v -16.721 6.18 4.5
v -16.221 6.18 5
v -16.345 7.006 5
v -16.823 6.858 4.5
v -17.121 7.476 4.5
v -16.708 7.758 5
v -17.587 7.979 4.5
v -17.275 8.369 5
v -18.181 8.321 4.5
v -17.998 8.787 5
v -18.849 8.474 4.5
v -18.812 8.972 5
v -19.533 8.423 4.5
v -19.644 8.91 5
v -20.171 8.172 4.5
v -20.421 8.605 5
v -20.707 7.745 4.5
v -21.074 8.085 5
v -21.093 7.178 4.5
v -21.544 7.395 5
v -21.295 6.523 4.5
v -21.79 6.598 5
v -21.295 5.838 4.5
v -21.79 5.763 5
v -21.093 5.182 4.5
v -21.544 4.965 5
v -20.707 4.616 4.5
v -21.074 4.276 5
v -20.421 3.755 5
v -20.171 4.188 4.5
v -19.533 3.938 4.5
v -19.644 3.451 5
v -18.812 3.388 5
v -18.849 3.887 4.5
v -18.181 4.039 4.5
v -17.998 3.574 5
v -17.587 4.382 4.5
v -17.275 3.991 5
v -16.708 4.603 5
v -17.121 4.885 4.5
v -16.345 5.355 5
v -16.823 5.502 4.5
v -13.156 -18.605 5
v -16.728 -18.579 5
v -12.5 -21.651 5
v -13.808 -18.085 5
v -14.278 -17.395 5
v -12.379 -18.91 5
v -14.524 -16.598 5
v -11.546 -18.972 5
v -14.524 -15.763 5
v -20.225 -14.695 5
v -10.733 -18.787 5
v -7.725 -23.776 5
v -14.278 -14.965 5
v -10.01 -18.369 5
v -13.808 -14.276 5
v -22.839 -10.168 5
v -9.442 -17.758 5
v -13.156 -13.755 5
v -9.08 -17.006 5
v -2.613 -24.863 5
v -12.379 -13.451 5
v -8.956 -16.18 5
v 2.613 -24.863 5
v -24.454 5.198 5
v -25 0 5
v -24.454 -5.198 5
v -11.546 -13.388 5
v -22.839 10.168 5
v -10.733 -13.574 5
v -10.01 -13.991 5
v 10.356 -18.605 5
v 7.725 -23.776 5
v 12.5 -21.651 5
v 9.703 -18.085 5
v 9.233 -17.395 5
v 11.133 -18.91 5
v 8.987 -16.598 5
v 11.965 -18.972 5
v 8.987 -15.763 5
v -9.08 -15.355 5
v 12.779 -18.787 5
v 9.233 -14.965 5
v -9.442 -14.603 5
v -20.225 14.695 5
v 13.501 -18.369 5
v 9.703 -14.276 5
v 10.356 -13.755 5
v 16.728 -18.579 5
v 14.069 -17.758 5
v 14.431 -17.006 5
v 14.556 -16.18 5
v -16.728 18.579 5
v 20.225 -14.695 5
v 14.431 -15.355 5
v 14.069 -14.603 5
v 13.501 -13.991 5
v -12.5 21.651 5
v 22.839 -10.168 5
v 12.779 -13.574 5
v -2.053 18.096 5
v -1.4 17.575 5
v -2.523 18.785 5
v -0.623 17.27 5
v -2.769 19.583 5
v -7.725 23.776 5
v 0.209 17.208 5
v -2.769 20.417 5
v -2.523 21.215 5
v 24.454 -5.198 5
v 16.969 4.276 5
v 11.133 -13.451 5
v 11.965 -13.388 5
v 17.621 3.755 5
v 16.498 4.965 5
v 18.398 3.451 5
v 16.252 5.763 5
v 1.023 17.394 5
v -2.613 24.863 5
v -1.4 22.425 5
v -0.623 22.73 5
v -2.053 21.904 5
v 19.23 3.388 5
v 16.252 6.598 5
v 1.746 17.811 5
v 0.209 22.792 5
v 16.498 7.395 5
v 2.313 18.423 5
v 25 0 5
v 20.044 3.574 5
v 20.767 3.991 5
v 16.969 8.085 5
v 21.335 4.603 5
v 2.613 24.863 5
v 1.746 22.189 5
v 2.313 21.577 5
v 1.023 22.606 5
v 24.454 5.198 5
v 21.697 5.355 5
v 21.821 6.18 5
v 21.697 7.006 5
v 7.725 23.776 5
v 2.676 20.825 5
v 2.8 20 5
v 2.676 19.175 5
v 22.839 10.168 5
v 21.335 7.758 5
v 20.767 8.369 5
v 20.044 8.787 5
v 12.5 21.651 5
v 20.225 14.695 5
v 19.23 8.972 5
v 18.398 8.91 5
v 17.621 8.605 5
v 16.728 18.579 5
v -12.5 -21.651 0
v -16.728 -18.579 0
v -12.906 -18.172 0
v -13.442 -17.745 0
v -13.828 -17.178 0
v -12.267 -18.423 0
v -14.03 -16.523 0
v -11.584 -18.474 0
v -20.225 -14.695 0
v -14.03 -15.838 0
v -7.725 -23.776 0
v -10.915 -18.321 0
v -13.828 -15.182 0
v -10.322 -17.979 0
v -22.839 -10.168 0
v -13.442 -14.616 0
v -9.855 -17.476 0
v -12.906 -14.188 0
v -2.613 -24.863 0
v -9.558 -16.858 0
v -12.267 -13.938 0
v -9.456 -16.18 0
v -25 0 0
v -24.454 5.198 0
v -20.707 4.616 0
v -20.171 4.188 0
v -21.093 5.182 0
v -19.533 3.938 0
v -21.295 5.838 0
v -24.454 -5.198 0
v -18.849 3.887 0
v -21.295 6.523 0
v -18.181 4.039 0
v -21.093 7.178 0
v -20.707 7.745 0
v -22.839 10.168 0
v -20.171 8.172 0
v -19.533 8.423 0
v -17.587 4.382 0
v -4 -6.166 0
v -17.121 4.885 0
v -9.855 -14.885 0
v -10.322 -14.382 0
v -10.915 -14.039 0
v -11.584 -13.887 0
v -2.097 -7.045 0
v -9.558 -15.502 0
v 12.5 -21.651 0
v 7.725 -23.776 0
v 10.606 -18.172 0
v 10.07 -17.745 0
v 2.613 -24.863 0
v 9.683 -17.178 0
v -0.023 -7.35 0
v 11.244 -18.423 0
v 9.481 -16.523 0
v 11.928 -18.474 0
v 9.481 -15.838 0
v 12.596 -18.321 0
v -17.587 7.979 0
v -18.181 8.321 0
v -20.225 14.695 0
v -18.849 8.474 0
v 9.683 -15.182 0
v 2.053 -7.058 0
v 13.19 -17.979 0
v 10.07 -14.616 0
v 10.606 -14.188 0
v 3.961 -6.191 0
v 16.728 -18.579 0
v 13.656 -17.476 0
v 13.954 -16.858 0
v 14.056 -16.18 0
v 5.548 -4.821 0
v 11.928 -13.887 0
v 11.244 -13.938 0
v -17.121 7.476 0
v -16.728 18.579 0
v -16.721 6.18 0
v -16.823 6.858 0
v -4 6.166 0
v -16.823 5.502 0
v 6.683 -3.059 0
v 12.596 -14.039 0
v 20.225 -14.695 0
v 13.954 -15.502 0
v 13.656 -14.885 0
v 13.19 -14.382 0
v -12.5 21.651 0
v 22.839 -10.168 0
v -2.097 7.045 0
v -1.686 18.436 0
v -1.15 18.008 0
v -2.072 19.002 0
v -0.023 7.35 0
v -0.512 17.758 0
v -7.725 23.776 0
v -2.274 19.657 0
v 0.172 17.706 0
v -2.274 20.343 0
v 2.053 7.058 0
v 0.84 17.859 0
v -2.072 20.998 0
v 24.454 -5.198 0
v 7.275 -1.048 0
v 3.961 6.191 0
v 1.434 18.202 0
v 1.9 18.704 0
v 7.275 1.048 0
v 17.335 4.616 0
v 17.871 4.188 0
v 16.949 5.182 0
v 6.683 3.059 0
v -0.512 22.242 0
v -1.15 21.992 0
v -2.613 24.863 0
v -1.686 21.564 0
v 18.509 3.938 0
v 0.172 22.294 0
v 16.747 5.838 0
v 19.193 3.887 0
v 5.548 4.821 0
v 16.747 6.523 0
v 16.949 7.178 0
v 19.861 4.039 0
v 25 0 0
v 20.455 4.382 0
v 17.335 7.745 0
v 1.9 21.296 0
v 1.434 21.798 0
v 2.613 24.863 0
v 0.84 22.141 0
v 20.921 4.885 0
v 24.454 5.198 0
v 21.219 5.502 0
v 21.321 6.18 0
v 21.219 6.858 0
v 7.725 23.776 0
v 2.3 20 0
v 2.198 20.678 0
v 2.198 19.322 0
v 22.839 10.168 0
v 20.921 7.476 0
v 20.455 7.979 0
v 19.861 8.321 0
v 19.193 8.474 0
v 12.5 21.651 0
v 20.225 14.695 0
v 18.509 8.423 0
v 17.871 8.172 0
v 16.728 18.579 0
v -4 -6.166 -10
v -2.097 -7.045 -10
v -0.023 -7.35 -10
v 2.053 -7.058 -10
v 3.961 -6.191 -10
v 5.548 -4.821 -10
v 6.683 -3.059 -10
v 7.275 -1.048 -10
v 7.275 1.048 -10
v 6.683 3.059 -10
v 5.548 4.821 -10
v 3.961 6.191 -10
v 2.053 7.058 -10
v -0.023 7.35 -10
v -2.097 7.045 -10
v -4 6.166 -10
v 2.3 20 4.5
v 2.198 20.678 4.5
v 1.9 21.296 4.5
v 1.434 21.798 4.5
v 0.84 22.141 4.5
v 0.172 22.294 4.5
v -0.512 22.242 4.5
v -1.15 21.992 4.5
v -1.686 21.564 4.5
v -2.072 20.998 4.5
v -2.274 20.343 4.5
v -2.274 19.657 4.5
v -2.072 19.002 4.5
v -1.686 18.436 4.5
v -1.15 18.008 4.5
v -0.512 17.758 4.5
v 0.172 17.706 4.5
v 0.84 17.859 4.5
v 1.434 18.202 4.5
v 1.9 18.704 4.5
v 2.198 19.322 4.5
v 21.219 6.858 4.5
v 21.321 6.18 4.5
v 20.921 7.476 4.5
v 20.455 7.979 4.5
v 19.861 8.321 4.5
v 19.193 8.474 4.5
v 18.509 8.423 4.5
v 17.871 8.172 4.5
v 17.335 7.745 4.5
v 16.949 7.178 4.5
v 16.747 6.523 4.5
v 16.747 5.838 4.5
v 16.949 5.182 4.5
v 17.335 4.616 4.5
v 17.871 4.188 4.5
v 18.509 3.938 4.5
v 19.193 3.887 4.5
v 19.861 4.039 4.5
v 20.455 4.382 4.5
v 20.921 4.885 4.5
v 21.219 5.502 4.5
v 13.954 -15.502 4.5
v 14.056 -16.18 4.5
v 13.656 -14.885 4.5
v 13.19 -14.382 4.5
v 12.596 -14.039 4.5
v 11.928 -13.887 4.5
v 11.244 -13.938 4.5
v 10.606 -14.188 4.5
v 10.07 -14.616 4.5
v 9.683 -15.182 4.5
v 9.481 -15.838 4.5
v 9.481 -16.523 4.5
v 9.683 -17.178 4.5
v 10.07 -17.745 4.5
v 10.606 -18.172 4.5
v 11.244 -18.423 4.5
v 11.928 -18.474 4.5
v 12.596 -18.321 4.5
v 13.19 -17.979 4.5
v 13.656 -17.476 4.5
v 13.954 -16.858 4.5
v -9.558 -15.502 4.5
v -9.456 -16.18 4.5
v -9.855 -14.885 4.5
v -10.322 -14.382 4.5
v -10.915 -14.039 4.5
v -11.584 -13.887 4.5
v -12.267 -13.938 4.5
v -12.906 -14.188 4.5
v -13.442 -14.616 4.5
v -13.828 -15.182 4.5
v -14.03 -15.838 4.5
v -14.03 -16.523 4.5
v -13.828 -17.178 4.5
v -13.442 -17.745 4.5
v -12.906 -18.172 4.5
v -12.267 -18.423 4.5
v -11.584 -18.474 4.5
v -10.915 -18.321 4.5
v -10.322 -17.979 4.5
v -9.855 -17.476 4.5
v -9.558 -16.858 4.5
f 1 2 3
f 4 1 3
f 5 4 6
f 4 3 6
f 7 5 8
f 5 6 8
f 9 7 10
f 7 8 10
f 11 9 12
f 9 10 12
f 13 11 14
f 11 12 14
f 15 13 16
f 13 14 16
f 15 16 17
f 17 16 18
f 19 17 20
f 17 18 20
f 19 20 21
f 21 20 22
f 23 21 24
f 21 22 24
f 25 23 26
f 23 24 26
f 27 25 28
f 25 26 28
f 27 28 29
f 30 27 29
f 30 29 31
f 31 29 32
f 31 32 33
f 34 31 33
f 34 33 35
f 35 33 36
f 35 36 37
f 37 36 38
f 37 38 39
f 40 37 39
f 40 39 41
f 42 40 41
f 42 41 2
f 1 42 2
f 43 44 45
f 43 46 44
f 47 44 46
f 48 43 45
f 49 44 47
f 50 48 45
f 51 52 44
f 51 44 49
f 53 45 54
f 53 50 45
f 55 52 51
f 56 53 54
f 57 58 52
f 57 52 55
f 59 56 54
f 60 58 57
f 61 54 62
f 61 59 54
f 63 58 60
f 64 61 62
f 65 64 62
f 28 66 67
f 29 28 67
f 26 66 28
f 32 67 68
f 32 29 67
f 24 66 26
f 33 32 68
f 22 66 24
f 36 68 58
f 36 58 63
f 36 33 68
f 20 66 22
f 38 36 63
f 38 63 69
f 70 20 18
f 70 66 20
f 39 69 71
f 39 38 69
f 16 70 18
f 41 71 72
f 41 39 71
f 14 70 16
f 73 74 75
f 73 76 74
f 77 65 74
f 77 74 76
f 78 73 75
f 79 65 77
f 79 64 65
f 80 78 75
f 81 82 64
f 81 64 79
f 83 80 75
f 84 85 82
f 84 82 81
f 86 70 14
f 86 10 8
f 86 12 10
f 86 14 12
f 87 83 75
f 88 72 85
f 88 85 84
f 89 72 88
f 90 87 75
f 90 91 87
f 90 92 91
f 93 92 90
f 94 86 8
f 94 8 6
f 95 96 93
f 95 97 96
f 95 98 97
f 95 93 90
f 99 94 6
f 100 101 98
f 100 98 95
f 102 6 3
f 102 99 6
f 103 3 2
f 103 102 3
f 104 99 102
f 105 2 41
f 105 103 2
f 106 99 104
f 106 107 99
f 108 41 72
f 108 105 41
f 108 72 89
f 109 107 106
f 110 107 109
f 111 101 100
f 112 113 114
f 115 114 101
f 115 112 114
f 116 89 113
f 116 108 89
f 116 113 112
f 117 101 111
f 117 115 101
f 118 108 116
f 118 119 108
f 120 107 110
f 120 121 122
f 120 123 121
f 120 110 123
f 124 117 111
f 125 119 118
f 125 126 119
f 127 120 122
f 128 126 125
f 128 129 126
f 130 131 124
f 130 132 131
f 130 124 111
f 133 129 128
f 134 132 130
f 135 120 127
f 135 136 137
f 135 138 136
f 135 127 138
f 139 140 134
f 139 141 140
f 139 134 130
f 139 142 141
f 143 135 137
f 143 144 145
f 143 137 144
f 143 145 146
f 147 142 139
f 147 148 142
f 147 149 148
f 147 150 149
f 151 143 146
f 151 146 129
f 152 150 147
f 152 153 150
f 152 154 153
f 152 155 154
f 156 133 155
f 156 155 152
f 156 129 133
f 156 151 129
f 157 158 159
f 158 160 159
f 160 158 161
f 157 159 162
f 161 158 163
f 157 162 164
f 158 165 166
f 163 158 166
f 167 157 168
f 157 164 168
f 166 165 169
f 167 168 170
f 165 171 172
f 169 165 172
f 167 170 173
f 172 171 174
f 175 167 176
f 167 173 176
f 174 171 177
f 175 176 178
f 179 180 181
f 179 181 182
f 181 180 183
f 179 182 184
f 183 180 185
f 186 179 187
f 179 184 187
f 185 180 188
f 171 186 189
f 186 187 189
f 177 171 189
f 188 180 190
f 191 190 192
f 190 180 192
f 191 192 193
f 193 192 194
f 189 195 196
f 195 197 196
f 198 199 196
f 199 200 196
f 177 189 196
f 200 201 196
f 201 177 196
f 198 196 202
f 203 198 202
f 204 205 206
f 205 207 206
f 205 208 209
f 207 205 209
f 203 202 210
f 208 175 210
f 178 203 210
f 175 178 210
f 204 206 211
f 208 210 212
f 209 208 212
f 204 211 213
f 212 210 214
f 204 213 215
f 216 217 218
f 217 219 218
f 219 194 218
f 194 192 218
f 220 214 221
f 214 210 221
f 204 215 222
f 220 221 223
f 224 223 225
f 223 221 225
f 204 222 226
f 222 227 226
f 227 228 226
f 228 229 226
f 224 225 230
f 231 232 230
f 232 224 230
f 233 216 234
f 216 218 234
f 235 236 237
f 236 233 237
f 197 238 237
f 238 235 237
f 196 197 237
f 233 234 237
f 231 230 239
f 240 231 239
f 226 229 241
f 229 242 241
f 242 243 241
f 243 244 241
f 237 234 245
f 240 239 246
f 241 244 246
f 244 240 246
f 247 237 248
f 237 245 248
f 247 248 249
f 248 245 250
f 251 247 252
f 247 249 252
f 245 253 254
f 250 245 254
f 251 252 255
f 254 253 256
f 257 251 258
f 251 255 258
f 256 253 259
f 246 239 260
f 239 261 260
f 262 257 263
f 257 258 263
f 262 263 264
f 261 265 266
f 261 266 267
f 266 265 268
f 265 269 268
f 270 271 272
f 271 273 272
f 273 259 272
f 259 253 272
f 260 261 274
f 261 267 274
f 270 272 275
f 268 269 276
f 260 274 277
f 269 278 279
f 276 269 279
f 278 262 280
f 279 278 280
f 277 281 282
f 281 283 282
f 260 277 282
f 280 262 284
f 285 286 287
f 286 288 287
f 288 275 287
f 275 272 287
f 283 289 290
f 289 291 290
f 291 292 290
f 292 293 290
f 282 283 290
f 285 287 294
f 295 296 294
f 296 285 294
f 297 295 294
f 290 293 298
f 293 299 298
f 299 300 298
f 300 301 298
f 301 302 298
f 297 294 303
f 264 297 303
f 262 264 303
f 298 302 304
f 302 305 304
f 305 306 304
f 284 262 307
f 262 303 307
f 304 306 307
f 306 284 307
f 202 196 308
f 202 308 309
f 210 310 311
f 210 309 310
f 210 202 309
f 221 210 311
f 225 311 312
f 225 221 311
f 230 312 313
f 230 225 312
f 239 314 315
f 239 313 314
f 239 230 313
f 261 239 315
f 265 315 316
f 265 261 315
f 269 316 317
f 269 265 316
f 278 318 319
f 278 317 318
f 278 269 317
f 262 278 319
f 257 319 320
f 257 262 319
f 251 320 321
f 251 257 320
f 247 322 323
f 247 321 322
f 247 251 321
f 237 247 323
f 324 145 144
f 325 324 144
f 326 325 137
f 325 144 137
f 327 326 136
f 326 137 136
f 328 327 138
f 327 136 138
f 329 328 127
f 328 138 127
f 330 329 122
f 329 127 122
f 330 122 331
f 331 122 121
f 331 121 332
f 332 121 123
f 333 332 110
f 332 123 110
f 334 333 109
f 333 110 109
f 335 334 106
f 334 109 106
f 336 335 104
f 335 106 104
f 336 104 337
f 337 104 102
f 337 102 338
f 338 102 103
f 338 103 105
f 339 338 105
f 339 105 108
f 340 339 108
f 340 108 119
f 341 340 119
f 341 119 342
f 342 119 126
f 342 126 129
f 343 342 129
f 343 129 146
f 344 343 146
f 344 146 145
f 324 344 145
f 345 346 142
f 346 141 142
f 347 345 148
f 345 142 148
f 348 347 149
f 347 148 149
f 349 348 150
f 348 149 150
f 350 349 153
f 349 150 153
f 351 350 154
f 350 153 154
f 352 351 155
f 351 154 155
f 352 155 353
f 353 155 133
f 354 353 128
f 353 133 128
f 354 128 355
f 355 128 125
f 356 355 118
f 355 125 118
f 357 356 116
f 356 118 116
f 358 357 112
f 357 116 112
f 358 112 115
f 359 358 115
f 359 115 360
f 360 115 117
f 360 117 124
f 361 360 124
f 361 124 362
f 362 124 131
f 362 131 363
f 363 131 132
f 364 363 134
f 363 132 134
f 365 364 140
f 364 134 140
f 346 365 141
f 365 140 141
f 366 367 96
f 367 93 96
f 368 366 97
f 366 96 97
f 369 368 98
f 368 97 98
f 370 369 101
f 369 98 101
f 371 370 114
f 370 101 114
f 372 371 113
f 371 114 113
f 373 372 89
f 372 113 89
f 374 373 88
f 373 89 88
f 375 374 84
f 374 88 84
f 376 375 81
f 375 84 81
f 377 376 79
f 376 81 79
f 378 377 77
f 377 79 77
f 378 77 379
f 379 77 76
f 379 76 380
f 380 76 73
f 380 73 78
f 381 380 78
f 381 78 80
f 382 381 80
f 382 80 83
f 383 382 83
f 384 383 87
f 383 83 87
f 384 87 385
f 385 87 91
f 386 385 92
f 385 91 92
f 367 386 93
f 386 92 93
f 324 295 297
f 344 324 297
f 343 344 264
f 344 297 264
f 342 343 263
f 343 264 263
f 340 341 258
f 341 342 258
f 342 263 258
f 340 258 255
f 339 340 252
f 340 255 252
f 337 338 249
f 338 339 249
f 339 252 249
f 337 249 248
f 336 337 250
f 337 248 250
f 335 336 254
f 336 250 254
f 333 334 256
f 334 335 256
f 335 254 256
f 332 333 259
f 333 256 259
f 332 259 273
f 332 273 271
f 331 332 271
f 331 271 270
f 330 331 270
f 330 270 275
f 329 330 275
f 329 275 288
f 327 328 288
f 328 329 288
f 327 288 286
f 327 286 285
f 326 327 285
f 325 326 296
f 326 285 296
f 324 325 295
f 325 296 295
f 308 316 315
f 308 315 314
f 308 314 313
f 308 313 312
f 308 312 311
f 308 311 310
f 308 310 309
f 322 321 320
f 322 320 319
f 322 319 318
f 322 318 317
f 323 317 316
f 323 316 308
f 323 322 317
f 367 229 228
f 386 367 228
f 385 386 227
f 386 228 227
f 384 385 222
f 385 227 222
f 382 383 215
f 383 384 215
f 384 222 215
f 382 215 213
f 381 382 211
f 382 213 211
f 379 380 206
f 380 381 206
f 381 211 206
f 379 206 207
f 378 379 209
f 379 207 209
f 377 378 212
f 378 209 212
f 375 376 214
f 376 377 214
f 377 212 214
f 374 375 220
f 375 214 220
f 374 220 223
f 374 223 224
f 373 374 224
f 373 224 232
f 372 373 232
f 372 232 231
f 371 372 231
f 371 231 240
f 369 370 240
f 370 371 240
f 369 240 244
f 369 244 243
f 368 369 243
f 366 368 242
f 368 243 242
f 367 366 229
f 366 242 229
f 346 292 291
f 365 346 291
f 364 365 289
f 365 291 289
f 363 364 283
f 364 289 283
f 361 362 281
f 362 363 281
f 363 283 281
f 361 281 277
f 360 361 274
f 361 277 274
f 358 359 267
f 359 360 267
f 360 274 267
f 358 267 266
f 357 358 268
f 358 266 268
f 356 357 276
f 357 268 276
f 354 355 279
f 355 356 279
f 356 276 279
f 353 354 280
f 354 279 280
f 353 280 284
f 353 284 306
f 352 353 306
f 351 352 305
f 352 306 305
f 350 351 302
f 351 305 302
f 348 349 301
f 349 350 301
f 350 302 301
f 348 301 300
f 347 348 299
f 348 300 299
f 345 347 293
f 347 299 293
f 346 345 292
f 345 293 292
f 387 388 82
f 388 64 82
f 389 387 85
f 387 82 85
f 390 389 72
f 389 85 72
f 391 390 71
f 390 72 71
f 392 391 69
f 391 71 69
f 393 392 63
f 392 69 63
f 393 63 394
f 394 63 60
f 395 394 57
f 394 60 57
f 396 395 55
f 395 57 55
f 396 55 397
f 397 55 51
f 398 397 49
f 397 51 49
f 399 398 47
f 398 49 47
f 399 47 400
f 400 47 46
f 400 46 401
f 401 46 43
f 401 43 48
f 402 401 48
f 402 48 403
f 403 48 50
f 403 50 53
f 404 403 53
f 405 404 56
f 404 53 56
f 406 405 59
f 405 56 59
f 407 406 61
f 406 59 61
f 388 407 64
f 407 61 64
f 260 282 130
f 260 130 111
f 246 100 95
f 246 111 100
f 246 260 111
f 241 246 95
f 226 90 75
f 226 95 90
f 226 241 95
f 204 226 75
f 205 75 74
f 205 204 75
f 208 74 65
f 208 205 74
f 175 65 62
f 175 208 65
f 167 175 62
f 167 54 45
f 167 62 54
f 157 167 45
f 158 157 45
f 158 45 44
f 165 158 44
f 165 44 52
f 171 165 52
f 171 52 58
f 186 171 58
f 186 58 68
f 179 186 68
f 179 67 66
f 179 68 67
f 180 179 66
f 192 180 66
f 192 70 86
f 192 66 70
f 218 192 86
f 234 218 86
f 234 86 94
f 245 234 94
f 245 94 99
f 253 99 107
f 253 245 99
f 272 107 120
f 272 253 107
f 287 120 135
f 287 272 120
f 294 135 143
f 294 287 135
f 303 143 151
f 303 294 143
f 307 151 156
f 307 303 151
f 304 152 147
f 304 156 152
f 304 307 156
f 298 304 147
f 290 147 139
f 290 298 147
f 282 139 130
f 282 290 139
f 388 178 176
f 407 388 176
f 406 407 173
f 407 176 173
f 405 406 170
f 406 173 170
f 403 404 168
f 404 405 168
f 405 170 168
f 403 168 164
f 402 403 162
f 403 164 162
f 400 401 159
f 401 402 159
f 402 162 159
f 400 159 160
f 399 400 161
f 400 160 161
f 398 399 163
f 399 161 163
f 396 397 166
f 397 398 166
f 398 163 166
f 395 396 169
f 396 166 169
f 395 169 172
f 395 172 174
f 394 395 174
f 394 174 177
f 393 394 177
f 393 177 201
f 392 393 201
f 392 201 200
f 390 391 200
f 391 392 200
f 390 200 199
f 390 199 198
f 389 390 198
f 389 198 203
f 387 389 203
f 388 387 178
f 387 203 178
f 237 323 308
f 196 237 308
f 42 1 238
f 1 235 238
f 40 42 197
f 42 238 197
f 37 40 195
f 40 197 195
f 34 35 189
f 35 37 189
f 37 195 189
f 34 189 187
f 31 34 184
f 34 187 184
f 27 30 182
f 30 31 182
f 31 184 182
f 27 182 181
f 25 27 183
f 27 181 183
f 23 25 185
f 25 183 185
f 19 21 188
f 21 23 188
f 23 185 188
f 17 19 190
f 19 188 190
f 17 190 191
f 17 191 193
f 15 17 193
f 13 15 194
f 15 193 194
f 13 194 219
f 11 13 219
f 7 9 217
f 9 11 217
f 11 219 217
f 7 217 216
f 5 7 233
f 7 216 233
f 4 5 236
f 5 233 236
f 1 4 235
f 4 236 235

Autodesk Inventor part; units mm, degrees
ref_plane "YZ Plane" through (0, 0, 0) normal (1, 0, 0) x (0, 1, 0)
ref_plane "XZ Plane" through (0, 0, 0) normal (0, 1, 0) x (-1, 0, 0)
ref_plane "XY Plane" through (0, 0, 0) normal (0, 0, 1) x (1, 0, 0)
sketch "스케치1" plane through (0, 0, 0) normal (0, 0, 1) x (1, 0, 0)
  circle A0 centre (0, 0) radius 20 construction
  circle A1 centre (0, 20) radius 2.3
  circle A2 centre (-19.0211, 6.1803) radius 2.3
  circle A3 centre (-11.7557, -16.1803) radius 2.3
  circle A4 centre (11.7557, -16.1803) radius 2.3
  circle A5 centre (19.0211, 6.1803) radius 2.3
  circle A6 centre (0, 0) radius 25
  dimension "d0" = 40
  dimension "d1" = 4.6
  dimension "d4" = 360
  dimension "d6" = 50
extrude "돌출1" add sketch "스케치1" along normal blind 5
sketch "스케치2" plane through (0, 0, 0) normal (0, 0, -1) x (-1, 0, 0)
  circle A0 centre (0, 0) radius 7.35
  dimension "d9" = 14.7
extrude "돌출2" add sketch "스케치2" along normal blind 10
chamfer "모따기1" distance 0.5 angle 45 5 edges at (-21.3211, 6.1803, 5) (-2.3, 20, 5) (16.7211, 6.1803, 5) (9.4557, -16.1803, 5) (-14.0557, -16.1803, 5)
sketch "스케치3" plane through (0, 0, -10) normal (0, 0, -1) x (-1, 0, 0)
  circle A0 centre (0, 0) radius 7.35 projected
  line L0 (4, 6.1662) -> (4, -6.1662)
  dimension "d15" = 4
extrude "돌출3" cut sketch "스케치3" against normal blind 10 contours A0 L0 picked at (5.1167, 0)
properties part number "회전축 상단"
